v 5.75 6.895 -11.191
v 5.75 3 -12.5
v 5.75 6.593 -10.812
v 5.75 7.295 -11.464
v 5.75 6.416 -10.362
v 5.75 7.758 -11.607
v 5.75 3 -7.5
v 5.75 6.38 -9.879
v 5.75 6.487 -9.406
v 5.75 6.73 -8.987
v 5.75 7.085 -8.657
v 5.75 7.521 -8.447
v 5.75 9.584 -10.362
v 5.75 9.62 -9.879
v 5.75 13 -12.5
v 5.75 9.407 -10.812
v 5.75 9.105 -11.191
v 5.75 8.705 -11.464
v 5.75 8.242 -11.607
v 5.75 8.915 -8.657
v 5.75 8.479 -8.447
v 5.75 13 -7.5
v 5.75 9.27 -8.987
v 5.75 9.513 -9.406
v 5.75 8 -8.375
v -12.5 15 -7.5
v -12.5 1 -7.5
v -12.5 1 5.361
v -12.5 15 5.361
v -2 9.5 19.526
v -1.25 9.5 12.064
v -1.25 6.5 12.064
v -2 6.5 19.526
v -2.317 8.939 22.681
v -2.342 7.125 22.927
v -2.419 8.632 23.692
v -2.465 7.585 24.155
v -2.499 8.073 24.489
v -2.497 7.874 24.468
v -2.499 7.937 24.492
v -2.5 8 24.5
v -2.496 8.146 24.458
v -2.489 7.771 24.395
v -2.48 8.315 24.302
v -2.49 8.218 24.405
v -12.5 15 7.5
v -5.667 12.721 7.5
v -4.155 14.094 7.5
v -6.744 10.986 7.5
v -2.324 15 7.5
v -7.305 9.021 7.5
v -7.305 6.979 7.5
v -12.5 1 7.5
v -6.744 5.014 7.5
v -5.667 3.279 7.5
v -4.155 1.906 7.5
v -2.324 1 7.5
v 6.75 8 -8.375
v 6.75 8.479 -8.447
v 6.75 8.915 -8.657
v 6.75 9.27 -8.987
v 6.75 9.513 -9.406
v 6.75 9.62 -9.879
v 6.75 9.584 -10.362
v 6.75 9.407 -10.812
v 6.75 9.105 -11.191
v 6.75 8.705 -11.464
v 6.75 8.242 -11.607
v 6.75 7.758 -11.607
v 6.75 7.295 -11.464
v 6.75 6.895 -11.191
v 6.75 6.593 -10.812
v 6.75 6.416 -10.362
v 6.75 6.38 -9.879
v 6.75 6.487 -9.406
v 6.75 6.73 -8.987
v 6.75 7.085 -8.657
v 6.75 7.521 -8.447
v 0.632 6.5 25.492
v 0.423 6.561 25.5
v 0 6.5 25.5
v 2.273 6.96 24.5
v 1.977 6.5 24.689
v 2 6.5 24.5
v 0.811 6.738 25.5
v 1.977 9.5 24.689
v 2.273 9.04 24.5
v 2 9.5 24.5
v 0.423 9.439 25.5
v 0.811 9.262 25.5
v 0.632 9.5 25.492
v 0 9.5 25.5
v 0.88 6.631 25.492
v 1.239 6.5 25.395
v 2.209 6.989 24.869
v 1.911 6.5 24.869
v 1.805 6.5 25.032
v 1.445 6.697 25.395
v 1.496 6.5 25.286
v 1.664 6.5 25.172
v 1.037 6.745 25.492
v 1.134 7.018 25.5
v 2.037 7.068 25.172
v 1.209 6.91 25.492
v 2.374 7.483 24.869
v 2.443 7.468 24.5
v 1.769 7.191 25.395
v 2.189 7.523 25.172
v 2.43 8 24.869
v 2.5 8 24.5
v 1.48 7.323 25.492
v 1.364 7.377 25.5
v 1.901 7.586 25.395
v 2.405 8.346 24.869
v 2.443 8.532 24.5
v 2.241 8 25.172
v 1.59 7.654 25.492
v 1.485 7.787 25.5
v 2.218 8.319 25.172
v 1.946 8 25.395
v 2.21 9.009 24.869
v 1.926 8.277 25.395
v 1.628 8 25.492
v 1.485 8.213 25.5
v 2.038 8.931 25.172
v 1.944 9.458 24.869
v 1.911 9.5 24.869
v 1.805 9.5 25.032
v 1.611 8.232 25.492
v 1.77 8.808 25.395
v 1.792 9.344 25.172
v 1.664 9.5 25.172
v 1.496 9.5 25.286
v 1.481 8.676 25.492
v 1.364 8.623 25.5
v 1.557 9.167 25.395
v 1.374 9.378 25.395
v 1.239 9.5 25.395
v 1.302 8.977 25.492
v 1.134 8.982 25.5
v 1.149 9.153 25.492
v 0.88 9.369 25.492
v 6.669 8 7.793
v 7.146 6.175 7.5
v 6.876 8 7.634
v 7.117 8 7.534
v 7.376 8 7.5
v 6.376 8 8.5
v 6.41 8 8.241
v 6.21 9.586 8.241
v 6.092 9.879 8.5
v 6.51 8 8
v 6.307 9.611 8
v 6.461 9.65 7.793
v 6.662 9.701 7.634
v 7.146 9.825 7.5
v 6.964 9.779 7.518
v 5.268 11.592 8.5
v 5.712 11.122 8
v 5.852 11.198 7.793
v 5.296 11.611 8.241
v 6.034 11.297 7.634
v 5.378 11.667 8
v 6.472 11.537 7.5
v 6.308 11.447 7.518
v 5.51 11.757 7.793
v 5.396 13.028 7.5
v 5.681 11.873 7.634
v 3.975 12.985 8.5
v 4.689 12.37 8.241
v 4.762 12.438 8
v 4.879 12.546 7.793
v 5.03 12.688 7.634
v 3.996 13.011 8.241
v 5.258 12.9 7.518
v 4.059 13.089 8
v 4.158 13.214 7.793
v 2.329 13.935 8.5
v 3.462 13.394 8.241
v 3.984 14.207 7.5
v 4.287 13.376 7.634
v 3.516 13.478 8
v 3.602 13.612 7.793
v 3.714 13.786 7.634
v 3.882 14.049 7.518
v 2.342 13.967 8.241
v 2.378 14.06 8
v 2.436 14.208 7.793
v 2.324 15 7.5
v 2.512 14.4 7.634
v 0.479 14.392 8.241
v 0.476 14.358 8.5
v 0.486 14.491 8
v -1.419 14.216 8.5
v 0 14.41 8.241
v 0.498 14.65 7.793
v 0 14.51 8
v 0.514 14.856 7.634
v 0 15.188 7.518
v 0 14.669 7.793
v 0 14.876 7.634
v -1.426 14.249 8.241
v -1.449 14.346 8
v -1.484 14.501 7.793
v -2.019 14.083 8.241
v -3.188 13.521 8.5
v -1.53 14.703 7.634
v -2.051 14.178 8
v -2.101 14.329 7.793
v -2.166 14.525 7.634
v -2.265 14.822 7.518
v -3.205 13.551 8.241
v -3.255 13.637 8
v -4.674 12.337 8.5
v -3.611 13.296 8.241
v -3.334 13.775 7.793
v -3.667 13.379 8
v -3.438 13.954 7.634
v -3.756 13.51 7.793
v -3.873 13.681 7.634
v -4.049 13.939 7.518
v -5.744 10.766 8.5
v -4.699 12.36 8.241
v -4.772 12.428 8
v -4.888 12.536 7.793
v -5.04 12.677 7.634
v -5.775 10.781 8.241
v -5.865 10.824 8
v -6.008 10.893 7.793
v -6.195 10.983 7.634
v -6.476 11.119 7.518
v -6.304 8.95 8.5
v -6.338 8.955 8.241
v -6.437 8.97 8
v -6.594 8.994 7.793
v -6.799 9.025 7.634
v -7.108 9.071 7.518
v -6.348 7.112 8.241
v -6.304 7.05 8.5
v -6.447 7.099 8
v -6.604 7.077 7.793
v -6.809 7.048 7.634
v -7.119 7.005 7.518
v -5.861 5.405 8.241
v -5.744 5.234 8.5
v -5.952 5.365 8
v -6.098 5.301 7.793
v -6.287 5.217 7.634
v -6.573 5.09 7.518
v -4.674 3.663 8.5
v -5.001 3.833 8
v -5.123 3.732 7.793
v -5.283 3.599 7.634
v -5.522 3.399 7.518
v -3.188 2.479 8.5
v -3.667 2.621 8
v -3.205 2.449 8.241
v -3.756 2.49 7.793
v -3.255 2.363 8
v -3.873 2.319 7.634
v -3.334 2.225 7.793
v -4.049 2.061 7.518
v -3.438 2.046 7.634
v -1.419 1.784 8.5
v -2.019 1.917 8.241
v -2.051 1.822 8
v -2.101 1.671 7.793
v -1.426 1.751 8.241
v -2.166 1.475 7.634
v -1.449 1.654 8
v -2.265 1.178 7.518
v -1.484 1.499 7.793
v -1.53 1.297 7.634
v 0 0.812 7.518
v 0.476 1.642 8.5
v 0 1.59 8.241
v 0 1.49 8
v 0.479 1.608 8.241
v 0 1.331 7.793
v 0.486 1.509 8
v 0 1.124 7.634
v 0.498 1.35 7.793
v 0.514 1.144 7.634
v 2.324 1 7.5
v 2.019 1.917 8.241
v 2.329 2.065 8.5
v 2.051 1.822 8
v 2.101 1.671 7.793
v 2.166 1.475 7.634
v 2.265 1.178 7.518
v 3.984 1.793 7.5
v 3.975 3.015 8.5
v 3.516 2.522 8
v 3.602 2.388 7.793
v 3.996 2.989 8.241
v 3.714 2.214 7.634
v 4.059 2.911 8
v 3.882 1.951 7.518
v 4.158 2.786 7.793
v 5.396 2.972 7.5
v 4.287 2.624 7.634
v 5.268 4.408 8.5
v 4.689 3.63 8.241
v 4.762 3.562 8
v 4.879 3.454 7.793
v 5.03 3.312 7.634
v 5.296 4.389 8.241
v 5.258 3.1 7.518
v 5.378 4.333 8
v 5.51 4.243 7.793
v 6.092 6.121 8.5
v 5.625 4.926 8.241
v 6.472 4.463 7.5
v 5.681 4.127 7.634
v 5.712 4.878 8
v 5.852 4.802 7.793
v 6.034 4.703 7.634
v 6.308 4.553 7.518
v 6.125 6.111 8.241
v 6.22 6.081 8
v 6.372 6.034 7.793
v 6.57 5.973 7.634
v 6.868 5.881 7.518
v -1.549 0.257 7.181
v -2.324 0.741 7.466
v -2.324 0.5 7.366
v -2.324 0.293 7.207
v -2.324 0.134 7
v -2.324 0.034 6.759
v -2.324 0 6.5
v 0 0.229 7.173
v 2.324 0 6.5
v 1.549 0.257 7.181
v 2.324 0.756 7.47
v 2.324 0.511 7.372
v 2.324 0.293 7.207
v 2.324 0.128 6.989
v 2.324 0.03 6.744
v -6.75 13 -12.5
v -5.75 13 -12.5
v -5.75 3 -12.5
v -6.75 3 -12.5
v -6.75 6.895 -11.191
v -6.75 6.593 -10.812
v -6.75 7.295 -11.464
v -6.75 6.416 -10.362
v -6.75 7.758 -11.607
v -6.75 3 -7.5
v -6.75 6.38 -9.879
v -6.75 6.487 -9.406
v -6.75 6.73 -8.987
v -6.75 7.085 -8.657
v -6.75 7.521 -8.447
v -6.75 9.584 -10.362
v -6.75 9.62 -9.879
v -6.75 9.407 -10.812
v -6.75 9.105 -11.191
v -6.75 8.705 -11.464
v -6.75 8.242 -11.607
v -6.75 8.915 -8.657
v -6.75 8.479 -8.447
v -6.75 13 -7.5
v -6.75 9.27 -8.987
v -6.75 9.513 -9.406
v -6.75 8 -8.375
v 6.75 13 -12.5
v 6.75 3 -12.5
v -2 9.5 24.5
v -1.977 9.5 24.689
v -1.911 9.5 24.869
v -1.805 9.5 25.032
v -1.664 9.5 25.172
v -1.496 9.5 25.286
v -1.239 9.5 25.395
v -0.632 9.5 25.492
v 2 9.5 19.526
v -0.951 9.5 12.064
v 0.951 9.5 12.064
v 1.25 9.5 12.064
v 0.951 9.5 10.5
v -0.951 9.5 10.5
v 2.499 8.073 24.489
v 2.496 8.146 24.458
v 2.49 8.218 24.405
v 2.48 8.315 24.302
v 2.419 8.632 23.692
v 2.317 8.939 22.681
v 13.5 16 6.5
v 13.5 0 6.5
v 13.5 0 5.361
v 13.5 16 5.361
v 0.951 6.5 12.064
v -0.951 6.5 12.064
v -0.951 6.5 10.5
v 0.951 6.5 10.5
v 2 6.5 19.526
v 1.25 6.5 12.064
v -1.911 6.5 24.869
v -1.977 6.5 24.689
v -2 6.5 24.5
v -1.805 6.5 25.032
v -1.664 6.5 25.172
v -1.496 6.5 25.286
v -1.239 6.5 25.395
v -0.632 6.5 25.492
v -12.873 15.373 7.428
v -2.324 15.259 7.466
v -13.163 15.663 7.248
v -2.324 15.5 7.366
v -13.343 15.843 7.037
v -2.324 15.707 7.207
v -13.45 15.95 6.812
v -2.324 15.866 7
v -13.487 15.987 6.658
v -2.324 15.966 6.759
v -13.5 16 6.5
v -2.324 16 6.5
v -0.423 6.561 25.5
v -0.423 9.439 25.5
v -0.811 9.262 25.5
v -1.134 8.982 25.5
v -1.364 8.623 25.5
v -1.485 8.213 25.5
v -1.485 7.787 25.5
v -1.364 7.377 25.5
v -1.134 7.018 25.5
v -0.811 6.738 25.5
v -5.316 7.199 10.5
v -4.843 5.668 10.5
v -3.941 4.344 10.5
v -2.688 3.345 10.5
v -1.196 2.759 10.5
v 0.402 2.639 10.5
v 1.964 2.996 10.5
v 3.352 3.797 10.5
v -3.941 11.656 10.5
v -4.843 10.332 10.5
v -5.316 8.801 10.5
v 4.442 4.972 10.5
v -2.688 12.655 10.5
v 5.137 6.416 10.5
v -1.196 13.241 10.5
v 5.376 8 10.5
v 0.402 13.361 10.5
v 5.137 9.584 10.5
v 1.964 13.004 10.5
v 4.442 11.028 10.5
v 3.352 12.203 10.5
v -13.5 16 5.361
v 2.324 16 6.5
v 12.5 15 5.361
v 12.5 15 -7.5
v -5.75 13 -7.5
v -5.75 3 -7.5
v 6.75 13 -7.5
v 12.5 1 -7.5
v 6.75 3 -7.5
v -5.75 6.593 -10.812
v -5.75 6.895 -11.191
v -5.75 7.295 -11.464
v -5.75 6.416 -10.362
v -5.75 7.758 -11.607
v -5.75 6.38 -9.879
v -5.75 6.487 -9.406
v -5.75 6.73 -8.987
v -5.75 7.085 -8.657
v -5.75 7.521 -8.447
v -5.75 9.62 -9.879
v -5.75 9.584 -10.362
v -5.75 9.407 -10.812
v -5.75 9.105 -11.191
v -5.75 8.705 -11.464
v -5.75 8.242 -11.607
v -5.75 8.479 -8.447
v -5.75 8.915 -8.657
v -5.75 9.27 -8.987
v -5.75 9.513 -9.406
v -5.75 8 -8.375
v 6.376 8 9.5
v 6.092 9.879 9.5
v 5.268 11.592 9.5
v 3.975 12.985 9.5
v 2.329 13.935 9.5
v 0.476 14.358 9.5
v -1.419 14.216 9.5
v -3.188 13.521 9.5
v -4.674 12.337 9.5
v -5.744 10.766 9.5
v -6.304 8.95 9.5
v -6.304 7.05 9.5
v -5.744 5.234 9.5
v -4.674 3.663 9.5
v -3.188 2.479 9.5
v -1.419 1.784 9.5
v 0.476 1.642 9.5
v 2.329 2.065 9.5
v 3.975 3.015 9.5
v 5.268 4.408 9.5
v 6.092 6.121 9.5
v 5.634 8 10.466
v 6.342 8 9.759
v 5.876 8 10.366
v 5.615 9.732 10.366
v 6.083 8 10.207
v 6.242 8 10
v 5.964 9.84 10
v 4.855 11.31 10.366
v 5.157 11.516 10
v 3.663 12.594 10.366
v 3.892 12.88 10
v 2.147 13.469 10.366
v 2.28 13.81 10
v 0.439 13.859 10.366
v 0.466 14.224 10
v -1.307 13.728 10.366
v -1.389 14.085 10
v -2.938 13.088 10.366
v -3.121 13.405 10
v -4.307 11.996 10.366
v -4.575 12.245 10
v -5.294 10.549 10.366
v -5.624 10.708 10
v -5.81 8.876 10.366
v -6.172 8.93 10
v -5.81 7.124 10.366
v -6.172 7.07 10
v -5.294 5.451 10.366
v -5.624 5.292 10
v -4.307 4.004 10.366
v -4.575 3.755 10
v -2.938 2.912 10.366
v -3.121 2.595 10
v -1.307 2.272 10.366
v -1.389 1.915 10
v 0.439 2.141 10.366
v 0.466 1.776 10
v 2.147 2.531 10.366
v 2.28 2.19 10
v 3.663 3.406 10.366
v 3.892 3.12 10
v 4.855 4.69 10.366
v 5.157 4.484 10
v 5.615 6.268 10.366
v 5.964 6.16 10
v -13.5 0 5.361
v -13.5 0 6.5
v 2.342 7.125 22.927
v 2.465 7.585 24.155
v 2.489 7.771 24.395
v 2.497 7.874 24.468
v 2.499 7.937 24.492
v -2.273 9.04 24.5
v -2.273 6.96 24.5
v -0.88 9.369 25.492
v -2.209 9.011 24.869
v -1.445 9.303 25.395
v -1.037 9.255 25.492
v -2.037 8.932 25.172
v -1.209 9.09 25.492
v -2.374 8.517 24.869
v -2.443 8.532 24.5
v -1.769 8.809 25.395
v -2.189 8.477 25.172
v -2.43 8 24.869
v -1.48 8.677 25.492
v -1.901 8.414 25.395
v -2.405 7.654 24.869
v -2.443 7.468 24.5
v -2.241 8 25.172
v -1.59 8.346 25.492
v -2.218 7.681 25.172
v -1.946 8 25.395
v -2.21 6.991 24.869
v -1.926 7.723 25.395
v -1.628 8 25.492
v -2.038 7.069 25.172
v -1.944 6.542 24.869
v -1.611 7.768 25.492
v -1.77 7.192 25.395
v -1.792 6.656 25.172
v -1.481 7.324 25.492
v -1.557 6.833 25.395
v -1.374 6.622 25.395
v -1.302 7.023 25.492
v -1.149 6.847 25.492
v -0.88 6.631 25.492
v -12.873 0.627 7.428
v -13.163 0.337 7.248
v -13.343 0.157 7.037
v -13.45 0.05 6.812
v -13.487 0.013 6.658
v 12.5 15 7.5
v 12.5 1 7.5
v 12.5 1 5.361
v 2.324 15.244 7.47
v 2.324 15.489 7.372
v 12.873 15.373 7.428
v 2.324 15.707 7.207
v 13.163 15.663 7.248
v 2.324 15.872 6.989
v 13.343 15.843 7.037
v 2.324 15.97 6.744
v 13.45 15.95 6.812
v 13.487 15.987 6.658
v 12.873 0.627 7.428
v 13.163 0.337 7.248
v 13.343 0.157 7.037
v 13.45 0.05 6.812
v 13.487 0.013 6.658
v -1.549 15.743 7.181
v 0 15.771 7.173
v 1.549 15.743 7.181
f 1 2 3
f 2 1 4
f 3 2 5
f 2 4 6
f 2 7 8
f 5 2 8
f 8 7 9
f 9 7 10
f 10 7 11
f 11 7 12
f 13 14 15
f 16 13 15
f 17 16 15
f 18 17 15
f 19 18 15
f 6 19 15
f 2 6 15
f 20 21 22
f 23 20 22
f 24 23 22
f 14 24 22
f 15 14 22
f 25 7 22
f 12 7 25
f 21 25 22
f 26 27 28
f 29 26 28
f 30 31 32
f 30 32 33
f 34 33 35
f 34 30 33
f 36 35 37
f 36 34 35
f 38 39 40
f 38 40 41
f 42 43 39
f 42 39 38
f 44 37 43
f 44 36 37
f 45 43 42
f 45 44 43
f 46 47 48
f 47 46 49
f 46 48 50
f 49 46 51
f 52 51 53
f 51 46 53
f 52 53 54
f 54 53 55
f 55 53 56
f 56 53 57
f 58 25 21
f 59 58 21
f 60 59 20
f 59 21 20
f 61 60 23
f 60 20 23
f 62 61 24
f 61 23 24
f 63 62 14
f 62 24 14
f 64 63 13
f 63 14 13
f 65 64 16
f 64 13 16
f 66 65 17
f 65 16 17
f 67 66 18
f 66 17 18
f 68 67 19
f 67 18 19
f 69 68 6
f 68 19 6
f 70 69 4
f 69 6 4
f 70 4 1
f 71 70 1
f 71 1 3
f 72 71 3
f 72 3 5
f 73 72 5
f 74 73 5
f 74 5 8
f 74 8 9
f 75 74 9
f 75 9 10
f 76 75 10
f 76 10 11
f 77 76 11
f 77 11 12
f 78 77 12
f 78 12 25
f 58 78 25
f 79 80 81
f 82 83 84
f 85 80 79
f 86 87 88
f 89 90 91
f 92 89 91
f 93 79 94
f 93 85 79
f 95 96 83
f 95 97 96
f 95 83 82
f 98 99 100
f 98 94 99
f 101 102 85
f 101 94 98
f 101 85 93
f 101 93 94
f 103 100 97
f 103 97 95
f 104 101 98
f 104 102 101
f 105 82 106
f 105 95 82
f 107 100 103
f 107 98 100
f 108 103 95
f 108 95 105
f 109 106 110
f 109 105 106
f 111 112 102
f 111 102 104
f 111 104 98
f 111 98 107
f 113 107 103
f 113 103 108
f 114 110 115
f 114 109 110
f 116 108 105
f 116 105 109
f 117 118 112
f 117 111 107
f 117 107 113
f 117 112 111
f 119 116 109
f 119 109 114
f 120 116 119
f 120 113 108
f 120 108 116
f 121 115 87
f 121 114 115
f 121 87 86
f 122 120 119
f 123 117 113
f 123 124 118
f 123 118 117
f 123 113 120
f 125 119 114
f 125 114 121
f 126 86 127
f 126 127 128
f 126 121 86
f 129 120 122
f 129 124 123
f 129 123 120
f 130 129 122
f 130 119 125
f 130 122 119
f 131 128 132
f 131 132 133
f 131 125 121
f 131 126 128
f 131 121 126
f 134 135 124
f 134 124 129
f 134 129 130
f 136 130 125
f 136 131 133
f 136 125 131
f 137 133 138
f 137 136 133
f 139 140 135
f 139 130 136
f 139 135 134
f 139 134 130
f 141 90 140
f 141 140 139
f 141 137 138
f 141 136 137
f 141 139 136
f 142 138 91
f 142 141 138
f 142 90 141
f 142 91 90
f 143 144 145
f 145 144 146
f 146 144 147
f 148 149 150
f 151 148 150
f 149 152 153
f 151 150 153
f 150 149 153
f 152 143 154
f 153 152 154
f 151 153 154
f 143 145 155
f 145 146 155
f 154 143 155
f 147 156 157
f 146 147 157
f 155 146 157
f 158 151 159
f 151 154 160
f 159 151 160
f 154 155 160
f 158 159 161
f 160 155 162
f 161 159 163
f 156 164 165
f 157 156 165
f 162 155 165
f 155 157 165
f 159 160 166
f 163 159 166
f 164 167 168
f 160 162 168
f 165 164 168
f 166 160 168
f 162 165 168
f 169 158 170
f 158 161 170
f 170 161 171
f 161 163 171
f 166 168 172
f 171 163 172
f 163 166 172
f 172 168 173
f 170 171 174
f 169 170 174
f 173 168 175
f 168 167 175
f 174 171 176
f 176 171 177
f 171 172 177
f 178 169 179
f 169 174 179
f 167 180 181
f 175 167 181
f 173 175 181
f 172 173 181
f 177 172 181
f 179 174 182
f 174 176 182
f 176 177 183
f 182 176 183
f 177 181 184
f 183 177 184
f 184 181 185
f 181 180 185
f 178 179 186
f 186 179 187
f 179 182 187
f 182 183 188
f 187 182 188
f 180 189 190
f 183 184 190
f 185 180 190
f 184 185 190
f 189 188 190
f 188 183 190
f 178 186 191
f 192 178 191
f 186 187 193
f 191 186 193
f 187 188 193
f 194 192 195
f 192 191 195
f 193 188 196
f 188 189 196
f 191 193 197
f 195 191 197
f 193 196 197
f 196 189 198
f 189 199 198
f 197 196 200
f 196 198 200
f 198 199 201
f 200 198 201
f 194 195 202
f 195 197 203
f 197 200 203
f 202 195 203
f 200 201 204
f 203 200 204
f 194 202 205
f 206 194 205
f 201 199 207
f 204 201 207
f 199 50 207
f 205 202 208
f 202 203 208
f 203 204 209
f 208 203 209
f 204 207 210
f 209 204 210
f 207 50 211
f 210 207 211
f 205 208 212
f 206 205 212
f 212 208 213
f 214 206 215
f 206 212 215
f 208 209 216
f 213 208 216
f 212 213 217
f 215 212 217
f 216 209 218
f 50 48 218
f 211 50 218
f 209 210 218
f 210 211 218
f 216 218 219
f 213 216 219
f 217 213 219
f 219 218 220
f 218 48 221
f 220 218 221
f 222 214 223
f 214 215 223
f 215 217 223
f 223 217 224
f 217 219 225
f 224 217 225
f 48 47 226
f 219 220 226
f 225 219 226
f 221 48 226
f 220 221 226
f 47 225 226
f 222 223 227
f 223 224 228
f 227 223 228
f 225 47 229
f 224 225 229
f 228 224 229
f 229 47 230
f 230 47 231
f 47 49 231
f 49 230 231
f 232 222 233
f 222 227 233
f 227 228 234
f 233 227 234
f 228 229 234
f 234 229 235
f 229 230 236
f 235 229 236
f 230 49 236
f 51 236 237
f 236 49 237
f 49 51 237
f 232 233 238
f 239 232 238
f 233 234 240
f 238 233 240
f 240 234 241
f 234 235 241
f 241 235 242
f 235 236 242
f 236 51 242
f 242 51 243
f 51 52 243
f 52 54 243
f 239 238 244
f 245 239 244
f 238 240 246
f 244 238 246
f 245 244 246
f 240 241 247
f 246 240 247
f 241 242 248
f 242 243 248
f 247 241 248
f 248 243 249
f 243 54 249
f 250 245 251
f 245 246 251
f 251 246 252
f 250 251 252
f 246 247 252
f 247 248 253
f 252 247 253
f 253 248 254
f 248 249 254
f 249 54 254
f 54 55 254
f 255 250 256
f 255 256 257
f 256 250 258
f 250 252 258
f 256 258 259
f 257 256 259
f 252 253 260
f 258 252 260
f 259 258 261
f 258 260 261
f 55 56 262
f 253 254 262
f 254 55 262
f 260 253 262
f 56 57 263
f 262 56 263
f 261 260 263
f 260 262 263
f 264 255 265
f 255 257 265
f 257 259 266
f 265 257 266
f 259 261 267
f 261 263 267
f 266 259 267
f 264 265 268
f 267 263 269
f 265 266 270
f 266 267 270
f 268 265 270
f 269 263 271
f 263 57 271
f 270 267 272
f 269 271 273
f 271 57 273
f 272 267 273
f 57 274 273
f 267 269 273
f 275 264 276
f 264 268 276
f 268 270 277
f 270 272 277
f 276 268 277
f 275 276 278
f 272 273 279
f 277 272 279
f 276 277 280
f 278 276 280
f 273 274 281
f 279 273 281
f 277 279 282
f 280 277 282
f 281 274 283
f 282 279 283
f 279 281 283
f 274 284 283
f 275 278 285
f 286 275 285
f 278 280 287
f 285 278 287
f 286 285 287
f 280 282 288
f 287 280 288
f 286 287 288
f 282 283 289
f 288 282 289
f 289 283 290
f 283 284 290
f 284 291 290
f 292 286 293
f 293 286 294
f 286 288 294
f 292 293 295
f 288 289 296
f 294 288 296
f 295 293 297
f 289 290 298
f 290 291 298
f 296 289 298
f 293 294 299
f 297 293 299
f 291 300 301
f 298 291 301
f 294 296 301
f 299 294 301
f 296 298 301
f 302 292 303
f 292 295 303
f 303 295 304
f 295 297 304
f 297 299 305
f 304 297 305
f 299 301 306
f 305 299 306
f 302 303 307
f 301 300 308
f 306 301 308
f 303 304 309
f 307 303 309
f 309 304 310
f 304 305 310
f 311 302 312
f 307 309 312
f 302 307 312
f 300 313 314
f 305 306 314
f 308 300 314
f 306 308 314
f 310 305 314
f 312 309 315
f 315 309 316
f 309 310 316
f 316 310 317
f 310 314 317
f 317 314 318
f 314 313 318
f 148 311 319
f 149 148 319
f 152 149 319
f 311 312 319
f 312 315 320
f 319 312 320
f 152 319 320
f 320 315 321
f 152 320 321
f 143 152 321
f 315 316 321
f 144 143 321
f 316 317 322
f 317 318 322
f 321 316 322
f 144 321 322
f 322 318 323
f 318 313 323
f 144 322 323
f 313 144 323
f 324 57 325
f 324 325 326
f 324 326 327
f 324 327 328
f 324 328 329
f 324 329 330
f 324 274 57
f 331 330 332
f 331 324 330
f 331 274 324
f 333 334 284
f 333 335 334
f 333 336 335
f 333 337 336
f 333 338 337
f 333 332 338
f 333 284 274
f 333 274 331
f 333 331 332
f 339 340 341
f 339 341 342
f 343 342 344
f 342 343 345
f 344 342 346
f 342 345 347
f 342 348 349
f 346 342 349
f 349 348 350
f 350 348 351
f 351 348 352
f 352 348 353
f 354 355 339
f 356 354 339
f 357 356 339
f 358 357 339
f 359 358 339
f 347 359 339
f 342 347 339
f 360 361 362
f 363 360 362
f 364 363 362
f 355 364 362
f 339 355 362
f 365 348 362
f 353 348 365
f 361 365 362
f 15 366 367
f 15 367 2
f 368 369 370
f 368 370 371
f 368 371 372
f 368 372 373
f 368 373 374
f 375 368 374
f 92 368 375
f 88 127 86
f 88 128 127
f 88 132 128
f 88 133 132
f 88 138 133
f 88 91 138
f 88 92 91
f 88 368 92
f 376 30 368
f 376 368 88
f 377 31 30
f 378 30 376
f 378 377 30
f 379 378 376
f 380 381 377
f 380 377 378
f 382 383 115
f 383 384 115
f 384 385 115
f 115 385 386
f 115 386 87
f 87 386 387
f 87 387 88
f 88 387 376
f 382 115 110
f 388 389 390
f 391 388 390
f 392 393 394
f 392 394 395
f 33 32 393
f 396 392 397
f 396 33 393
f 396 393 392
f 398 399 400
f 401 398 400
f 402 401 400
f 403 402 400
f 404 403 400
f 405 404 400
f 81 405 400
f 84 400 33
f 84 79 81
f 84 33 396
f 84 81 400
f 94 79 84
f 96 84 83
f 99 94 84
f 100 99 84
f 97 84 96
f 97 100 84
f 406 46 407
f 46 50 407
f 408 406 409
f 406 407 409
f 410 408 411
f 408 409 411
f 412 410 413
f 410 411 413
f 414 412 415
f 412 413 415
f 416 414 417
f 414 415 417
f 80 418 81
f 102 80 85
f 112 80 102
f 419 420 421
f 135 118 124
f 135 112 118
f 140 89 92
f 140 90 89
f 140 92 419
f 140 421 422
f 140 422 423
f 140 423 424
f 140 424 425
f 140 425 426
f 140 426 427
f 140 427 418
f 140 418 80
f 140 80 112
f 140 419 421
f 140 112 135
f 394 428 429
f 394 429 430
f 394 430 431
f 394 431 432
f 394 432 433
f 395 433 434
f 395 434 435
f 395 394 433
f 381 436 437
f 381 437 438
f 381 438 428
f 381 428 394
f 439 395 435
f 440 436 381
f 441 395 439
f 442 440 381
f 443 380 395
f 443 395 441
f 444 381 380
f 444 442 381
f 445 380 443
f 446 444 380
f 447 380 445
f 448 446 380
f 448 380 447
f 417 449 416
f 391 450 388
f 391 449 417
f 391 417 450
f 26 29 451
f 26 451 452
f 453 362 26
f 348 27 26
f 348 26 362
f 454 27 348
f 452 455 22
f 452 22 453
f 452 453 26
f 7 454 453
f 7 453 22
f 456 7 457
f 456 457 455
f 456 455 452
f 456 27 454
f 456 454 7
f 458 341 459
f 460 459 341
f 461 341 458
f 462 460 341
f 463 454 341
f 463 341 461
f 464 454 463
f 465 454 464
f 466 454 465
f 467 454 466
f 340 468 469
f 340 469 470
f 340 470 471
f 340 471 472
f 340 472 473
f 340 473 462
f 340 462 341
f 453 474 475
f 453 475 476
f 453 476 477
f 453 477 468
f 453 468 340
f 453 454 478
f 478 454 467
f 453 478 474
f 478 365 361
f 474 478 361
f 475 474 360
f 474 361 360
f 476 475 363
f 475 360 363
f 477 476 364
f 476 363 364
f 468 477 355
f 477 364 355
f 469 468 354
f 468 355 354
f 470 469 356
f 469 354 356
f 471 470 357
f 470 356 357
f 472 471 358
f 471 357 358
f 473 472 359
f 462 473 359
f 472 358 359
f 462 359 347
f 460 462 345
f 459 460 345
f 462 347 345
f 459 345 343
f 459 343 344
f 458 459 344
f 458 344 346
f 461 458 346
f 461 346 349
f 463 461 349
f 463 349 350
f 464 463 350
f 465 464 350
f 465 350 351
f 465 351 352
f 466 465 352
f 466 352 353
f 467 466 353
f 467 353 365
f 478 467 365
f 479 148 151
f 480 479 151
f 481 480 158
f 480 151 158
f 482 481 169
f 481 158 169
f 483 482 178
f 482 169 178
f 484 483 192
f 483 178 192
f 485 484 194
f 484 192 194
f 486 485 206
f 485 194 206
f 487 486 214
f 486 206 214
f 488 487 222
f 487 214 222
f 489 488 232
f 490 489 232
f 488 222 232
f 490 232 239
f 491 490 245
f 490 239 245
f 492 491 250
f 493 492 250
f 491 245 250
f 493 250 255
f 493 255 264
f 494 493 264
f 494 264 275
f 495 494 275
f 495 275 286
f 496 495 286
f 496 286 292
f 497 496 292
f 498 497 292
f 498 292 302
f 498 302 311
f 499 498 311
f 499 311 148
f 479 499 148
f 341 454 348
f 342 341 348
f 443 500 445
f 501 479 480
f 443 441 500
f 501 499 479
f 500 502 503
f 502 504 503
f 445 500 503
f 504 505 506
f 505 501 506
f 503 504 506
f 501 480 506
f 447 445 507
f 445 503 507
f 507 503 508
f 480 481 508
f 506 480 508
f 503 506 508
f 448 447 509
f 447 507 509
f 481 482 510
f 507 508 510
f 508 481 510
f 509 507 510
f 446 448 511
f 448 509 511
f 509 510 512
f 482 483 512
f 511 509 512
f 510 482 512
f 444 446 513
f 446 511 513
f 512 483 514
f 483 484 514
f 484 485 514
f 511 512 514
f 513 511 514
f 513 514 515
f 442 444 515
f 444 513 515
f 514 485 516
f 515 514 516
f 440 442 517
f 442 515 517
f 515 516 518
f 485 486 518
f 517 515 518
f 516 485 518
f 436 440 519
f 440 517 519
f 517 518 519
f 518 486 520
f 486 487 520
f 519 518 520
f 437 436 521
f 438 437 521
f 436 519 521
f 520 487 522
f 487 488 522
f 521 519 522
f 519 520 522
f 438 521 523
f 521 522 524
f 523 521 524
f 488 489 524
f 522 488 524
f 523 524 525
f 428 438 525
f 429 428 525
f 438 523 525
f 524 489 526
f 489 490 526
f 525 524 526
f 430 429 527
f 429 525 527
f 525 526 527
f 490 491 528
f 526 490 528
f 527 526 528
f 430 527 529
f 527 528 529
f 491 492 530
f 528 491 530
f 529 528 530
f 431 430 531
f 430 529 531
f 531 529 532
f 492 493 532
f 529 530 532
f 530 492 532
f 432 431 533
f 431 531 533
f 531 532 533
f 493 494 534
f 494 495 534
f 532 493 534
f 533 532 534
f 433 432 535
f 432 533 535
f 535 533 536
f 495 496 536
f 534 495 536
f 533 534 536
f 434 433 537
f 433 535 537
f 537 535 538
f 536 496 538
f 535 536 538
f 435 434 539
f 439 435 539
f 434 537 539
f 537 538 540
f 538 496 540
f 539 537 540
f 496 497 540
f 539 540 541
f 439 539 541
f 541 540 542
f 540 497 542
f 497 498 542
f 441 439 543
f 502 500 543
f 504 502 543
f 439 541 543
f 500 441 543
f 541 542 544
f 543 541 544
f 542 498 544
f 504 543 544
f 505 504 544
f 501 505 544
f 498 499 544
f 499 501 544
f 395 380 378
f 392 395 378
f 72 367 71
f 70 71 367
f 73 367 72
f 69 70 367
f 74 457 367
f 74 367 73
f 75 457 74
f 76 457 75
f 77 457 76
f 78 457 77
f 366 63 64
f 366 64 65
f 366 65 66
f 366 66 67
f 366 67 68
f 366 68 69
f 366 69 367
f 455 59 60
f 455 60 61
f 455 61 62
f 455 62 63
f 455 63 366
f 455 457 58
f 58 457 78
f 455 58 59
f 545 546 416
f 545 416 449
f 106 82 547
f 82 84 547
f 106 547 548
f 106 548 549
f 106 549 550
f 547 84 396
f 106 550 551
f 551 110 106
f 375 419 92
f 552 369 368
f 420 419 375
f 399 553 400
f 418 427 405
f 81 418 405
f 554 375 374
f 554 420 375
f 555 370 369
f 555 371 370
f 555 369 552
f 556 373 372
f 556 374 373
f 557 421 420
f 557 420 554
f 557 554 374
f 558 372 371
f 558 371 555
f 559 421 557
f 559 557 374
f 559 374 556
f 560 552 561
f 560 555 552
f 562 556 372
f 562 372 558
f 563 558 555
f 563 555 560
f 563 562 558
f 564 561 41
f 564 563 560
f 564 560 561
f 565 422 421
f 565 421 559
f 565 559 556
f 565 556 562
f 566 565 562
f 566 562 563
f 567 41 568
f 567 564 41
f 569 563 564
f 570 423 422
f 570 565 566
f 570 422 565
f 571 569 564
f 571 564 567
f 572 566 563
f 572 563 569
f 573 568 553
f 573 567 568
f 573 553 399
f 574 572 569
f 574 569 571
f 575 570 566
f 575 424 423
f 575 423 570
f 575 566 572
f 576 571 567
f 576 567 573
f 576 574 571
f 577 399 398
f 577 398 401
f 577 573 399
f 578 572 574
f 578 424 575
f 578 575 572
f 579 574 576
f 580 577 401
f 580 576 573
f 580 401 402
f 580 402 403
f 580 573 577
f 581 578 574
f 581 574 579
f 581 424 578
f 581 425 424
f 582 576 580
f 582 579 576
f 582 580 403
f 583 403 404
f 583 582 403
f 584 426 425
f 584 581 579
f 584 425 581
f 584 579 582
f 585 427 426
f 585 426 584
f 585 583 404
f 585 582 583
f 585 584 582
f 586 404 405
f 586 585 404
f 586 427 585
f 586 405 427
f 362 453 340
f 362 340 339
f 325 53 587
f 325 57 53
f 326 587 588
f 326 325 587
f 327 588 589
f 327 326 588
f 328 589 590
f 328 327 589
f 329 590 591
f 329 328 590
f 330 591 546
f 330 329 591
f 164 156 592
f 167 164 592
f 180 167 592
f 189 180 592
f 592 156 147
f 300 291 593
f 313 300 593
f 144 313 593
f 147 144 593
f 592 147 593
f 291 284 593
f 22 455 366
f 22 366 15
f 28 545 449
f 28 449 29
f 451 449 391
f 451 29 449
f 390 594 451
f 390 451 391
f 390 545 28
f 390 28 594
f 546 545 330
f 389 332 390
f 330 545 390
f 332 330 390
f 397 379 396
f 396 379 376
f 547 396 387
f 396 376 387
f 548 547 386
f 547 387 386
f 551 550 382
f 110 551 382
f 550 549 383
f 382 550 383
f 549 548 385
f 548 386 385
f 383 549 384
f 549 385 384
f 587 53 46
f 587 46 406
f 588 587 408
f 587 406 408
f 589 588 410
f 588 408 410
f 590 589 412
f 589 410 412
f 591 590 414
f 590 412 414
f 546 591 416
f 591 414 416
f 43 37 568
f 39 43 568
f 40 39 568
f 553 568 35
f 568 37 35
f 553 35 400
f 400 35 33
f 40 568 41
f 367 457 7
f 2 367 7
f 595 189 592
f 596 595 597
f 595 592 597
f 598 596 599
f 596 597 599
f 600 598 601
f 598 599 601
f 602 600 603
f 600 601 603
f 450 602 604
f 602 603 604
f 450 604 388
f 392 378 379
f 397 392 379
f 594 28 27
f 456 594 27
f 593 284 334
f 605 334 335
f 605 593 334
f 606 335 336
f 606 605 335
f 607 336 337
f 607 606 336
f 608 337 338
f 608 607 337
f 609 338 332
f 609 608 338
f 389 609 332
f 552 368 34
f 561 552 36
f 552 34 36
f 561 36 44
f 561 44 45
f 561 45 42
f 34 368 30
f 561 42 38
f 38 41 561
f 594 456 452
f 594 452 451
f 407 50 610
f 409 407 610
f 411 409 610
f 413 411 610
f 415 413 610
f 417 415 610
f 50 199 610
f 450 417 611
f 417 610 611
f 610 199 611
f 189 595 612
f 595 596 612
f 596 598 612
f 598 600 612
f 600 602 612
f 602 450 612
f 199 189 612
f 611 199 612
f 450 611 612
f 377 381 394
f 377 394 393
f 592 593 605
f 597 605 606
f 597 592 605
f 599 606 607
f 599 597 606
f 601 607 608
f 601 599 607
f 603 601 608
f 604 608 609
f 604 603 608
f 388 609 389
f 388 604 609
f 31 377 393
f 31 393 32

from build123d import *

# Parameters (mm, degrees)
ESQUISSE1_W             = 27
ESQUISSE1_H             = 15
BOSS_EXTRU_1_DEPTH      = 16
ESQUISSE2_W             = 1
ESQUISSE2_H             = 12.860678648
ENL_V_MAT_EXTRU_1_DEPTH = 16
ESQUISSE3_W             = 12.860678648
ESQUISSE3_H             = 1
ENL_V_MAT_EXTRU_2_DEPTH = 26
ESQUISSE4_R             = 6.375627484
BOSS_EXTRU_2_DEPTH      = 3
ESQUISSE5_R             = 2.5
BOSS_EXTRU_3_DEPTH      = 15
CONG_4_R                = 1
ESQUISSE6_W             = 7.518022456
ESQUISSE6_H             = 15.453712828
ENL_V_MAT_EXTRU_4_DEPTH = 6.5
ESQUISSE7_W             = 7.269073366
ESQUISSE7_H             = 15.09730622
ENL_V_MAT_EXTRU_5_DEPTH = 6.5
ENL_V_MAT_EXTRU_6_DEPTH = 6.5
CONG_5_R                = 1
CONG_6_R                = 1
ESQUISSE9_W             = 1
ESQUISSE9_H             = 10
BOSS_EXTRU_4_DEPTH      = 5
ESQUISSE10_R            = 1.625
ENL_V_MAT_EXTRU_7_DEPTH = 18


with BuildPart() as part:
    # Esquisse1 → Boss.-Extru.1 (new body)
    with BuildSketch(Plane(origin=(0, 0, 0), x_dir=(1, 0, 0), z_dir=(0, 1, 0))):
        Rectangle(ESQUISSE1_W, ESQUISSE1_H)
    extrude(amount=BOSS_EXTRU_1_DEPTH)

    # Esquisse2 → Enlèv. mat.-Extru.1 (cut)
    with BuildSketch(Plane.XZ):
        with Locations((-13, -1.069660676)):
            Rectangle(ESQUISSE2_W, ESQUISSE2_H)
        with Locations((13, -1.069660676)):
            Rectangle(ESQUISSE2_W, ESQUISSE2_H)
    extrude(amount=-ENL_V_MAT_EXTRU_1_DEPTH, mode=Mode.SUBTRACT)

    # Esquisse3 → Enlèv. mat.-Extru.2 (cut)
    with BuildSketch(Plane(origin=(12.5, 0, 0), x_dir=(0, 0, -1), z_dir=(1, 0, 0))):
        with Locations((1.069660676, 0.5)):
            Rectangle(ESQUISSE3_W, ESQUISSE3_H)
        with Locations((1.069660676, 15.5)):
            Rectangle(ESQUISSE3_W, ESQUISSE3_H)
    extrude(amount=-ENL_V_MAT_EXTRU_2_DEPTH, mode=Mode.SUBTRACT)

    # Esquisse4 → Boss.-Extru.2 (add)
    with BuildSketch(Plane.XY.offset(7.5)):
        with Locations((0, 8)):
            Circle(ESQUISSE4_R)
    extrude(amount=BOSS_EXTRU_2_DEPTH)

    # Esquisse5 → Boss.-Extru.3 (add)
    with BuildSketch(Plane.XY.offset(10.5)):
        with Locations((0, 8)):
            Circle(ESQUISSE5_R)
    extrude(amount=BOSS_EXTRU_3_DEPTH)

    # Congé4
    cong_4_edges = [part.edges().sort_by_distance(p)[0] for p in [
        (-2.5, 8, 25.5),
    ]]
    fillet(cong_4_edges, radius=CONG_4_R)

    # Esquisse6 → Enlèv. mat.-Extru.4 (cut)
    with BuildSketch(Plane(origin=(0, 16, 0), x_dir=(1, 0, 0), z_dir=(0, 1, 0))):
        with Locations((0, -18.226856414)):
            Rectangle(ESQUISSE6_W, ESQUISSE6_H)
    extrude(amount=-ENL_V_MAT_EXTRU_4_DEPTH, mode=Mode.SUBTRACT)

    # Esquisse7 → Enlèv. mat.-Extru.5 (cut)
    with BuildSketch(Plane.XZ):
        with Locations((0, 18.04865311)):
            Rectangle(ESQUISSE7_W, ESQUISSE7_H)
    extrude(amount=-ENL_V_MAT_EXTRU_5_DEPTH, mode=Mode.SUBTRACT)

    # Esquisse8 → Enlèv. mat.-Extru.6 (cut)
    with BuildSketch(Plane(origin=(0, 9.5, 0), x_dir=(1, 0, 0), z_dir=(0, 1, 0))):
        Polygon((2, -19.525589234), (2, -10.5), (0.951197678, -10.5), (0.951197678, -12.063973085), (1.25, -12.063973085), align=None)
        Polygon((2.5, -24.5), (2.5, -10.5), (2, -10.5), (2, -19.525589234), align=None)
        Polygon((-2.5, -10.5), (-0.951197678, -10.5), (-0.951197678, -12.063973085), (-1.25, -12.063973085), (-2.5, -24.5), align=None)
    extrude(amount=-ENL_V_MAT_EXTRU_6_DEPTH, mode=Mode.SUBTRACT)

    # Congé5
    cong_5_edges = [part.edges().sort_by_distance(p)[0] for p in [
        (-6.375627484, 8, 7.5),
        (-6.375627484, 8, 10.5),
    ]]
    fillet(cong_5_edges, radius=CONG_5_R)

    # Congé6
    cong_6_edges = [part.edges().sort_by_distance(p)[0] for p in [
        (0, 16, 7.5),
        (0, 0, 7.5),
        (13.5, 8, 7.5),
        (-13.5, 8, 7.5),
    ]]
    fillet(cong_6_edges, radius=CONG_6_R)

    # Esquisse9 → Boss.-Extru.4 (add)
    with BuildSketch(Plane(origin=(0, 0, -7.5), x_dir=(-1, 0, 0), z_dir=(0, 0, -1))):
        with Locations((6.25, 8)):
            Rectangle(ESQUISSE9_W, ESQUISSE9_H)
        with Locations((-6.25, 8)):
            Rectangle(ESQUISSE9_W, ESQUISSE9_H)
    extrude(amount=BOSS_EXTRU_4_DEPTH)

    # Esquisse10 → Enlèv. mat.-Extru.7 (cut)
    with BuildSketch(Plane.ZY.offset(6.75)):
        with Locations((-10, 8)):
            Circle(ESQUISSE10_R)
    extrude(amount=-ENL_V_MAT_EXTRU_7_DEPTH, mode=Mode.SUBTRACT)


solid = part.part
